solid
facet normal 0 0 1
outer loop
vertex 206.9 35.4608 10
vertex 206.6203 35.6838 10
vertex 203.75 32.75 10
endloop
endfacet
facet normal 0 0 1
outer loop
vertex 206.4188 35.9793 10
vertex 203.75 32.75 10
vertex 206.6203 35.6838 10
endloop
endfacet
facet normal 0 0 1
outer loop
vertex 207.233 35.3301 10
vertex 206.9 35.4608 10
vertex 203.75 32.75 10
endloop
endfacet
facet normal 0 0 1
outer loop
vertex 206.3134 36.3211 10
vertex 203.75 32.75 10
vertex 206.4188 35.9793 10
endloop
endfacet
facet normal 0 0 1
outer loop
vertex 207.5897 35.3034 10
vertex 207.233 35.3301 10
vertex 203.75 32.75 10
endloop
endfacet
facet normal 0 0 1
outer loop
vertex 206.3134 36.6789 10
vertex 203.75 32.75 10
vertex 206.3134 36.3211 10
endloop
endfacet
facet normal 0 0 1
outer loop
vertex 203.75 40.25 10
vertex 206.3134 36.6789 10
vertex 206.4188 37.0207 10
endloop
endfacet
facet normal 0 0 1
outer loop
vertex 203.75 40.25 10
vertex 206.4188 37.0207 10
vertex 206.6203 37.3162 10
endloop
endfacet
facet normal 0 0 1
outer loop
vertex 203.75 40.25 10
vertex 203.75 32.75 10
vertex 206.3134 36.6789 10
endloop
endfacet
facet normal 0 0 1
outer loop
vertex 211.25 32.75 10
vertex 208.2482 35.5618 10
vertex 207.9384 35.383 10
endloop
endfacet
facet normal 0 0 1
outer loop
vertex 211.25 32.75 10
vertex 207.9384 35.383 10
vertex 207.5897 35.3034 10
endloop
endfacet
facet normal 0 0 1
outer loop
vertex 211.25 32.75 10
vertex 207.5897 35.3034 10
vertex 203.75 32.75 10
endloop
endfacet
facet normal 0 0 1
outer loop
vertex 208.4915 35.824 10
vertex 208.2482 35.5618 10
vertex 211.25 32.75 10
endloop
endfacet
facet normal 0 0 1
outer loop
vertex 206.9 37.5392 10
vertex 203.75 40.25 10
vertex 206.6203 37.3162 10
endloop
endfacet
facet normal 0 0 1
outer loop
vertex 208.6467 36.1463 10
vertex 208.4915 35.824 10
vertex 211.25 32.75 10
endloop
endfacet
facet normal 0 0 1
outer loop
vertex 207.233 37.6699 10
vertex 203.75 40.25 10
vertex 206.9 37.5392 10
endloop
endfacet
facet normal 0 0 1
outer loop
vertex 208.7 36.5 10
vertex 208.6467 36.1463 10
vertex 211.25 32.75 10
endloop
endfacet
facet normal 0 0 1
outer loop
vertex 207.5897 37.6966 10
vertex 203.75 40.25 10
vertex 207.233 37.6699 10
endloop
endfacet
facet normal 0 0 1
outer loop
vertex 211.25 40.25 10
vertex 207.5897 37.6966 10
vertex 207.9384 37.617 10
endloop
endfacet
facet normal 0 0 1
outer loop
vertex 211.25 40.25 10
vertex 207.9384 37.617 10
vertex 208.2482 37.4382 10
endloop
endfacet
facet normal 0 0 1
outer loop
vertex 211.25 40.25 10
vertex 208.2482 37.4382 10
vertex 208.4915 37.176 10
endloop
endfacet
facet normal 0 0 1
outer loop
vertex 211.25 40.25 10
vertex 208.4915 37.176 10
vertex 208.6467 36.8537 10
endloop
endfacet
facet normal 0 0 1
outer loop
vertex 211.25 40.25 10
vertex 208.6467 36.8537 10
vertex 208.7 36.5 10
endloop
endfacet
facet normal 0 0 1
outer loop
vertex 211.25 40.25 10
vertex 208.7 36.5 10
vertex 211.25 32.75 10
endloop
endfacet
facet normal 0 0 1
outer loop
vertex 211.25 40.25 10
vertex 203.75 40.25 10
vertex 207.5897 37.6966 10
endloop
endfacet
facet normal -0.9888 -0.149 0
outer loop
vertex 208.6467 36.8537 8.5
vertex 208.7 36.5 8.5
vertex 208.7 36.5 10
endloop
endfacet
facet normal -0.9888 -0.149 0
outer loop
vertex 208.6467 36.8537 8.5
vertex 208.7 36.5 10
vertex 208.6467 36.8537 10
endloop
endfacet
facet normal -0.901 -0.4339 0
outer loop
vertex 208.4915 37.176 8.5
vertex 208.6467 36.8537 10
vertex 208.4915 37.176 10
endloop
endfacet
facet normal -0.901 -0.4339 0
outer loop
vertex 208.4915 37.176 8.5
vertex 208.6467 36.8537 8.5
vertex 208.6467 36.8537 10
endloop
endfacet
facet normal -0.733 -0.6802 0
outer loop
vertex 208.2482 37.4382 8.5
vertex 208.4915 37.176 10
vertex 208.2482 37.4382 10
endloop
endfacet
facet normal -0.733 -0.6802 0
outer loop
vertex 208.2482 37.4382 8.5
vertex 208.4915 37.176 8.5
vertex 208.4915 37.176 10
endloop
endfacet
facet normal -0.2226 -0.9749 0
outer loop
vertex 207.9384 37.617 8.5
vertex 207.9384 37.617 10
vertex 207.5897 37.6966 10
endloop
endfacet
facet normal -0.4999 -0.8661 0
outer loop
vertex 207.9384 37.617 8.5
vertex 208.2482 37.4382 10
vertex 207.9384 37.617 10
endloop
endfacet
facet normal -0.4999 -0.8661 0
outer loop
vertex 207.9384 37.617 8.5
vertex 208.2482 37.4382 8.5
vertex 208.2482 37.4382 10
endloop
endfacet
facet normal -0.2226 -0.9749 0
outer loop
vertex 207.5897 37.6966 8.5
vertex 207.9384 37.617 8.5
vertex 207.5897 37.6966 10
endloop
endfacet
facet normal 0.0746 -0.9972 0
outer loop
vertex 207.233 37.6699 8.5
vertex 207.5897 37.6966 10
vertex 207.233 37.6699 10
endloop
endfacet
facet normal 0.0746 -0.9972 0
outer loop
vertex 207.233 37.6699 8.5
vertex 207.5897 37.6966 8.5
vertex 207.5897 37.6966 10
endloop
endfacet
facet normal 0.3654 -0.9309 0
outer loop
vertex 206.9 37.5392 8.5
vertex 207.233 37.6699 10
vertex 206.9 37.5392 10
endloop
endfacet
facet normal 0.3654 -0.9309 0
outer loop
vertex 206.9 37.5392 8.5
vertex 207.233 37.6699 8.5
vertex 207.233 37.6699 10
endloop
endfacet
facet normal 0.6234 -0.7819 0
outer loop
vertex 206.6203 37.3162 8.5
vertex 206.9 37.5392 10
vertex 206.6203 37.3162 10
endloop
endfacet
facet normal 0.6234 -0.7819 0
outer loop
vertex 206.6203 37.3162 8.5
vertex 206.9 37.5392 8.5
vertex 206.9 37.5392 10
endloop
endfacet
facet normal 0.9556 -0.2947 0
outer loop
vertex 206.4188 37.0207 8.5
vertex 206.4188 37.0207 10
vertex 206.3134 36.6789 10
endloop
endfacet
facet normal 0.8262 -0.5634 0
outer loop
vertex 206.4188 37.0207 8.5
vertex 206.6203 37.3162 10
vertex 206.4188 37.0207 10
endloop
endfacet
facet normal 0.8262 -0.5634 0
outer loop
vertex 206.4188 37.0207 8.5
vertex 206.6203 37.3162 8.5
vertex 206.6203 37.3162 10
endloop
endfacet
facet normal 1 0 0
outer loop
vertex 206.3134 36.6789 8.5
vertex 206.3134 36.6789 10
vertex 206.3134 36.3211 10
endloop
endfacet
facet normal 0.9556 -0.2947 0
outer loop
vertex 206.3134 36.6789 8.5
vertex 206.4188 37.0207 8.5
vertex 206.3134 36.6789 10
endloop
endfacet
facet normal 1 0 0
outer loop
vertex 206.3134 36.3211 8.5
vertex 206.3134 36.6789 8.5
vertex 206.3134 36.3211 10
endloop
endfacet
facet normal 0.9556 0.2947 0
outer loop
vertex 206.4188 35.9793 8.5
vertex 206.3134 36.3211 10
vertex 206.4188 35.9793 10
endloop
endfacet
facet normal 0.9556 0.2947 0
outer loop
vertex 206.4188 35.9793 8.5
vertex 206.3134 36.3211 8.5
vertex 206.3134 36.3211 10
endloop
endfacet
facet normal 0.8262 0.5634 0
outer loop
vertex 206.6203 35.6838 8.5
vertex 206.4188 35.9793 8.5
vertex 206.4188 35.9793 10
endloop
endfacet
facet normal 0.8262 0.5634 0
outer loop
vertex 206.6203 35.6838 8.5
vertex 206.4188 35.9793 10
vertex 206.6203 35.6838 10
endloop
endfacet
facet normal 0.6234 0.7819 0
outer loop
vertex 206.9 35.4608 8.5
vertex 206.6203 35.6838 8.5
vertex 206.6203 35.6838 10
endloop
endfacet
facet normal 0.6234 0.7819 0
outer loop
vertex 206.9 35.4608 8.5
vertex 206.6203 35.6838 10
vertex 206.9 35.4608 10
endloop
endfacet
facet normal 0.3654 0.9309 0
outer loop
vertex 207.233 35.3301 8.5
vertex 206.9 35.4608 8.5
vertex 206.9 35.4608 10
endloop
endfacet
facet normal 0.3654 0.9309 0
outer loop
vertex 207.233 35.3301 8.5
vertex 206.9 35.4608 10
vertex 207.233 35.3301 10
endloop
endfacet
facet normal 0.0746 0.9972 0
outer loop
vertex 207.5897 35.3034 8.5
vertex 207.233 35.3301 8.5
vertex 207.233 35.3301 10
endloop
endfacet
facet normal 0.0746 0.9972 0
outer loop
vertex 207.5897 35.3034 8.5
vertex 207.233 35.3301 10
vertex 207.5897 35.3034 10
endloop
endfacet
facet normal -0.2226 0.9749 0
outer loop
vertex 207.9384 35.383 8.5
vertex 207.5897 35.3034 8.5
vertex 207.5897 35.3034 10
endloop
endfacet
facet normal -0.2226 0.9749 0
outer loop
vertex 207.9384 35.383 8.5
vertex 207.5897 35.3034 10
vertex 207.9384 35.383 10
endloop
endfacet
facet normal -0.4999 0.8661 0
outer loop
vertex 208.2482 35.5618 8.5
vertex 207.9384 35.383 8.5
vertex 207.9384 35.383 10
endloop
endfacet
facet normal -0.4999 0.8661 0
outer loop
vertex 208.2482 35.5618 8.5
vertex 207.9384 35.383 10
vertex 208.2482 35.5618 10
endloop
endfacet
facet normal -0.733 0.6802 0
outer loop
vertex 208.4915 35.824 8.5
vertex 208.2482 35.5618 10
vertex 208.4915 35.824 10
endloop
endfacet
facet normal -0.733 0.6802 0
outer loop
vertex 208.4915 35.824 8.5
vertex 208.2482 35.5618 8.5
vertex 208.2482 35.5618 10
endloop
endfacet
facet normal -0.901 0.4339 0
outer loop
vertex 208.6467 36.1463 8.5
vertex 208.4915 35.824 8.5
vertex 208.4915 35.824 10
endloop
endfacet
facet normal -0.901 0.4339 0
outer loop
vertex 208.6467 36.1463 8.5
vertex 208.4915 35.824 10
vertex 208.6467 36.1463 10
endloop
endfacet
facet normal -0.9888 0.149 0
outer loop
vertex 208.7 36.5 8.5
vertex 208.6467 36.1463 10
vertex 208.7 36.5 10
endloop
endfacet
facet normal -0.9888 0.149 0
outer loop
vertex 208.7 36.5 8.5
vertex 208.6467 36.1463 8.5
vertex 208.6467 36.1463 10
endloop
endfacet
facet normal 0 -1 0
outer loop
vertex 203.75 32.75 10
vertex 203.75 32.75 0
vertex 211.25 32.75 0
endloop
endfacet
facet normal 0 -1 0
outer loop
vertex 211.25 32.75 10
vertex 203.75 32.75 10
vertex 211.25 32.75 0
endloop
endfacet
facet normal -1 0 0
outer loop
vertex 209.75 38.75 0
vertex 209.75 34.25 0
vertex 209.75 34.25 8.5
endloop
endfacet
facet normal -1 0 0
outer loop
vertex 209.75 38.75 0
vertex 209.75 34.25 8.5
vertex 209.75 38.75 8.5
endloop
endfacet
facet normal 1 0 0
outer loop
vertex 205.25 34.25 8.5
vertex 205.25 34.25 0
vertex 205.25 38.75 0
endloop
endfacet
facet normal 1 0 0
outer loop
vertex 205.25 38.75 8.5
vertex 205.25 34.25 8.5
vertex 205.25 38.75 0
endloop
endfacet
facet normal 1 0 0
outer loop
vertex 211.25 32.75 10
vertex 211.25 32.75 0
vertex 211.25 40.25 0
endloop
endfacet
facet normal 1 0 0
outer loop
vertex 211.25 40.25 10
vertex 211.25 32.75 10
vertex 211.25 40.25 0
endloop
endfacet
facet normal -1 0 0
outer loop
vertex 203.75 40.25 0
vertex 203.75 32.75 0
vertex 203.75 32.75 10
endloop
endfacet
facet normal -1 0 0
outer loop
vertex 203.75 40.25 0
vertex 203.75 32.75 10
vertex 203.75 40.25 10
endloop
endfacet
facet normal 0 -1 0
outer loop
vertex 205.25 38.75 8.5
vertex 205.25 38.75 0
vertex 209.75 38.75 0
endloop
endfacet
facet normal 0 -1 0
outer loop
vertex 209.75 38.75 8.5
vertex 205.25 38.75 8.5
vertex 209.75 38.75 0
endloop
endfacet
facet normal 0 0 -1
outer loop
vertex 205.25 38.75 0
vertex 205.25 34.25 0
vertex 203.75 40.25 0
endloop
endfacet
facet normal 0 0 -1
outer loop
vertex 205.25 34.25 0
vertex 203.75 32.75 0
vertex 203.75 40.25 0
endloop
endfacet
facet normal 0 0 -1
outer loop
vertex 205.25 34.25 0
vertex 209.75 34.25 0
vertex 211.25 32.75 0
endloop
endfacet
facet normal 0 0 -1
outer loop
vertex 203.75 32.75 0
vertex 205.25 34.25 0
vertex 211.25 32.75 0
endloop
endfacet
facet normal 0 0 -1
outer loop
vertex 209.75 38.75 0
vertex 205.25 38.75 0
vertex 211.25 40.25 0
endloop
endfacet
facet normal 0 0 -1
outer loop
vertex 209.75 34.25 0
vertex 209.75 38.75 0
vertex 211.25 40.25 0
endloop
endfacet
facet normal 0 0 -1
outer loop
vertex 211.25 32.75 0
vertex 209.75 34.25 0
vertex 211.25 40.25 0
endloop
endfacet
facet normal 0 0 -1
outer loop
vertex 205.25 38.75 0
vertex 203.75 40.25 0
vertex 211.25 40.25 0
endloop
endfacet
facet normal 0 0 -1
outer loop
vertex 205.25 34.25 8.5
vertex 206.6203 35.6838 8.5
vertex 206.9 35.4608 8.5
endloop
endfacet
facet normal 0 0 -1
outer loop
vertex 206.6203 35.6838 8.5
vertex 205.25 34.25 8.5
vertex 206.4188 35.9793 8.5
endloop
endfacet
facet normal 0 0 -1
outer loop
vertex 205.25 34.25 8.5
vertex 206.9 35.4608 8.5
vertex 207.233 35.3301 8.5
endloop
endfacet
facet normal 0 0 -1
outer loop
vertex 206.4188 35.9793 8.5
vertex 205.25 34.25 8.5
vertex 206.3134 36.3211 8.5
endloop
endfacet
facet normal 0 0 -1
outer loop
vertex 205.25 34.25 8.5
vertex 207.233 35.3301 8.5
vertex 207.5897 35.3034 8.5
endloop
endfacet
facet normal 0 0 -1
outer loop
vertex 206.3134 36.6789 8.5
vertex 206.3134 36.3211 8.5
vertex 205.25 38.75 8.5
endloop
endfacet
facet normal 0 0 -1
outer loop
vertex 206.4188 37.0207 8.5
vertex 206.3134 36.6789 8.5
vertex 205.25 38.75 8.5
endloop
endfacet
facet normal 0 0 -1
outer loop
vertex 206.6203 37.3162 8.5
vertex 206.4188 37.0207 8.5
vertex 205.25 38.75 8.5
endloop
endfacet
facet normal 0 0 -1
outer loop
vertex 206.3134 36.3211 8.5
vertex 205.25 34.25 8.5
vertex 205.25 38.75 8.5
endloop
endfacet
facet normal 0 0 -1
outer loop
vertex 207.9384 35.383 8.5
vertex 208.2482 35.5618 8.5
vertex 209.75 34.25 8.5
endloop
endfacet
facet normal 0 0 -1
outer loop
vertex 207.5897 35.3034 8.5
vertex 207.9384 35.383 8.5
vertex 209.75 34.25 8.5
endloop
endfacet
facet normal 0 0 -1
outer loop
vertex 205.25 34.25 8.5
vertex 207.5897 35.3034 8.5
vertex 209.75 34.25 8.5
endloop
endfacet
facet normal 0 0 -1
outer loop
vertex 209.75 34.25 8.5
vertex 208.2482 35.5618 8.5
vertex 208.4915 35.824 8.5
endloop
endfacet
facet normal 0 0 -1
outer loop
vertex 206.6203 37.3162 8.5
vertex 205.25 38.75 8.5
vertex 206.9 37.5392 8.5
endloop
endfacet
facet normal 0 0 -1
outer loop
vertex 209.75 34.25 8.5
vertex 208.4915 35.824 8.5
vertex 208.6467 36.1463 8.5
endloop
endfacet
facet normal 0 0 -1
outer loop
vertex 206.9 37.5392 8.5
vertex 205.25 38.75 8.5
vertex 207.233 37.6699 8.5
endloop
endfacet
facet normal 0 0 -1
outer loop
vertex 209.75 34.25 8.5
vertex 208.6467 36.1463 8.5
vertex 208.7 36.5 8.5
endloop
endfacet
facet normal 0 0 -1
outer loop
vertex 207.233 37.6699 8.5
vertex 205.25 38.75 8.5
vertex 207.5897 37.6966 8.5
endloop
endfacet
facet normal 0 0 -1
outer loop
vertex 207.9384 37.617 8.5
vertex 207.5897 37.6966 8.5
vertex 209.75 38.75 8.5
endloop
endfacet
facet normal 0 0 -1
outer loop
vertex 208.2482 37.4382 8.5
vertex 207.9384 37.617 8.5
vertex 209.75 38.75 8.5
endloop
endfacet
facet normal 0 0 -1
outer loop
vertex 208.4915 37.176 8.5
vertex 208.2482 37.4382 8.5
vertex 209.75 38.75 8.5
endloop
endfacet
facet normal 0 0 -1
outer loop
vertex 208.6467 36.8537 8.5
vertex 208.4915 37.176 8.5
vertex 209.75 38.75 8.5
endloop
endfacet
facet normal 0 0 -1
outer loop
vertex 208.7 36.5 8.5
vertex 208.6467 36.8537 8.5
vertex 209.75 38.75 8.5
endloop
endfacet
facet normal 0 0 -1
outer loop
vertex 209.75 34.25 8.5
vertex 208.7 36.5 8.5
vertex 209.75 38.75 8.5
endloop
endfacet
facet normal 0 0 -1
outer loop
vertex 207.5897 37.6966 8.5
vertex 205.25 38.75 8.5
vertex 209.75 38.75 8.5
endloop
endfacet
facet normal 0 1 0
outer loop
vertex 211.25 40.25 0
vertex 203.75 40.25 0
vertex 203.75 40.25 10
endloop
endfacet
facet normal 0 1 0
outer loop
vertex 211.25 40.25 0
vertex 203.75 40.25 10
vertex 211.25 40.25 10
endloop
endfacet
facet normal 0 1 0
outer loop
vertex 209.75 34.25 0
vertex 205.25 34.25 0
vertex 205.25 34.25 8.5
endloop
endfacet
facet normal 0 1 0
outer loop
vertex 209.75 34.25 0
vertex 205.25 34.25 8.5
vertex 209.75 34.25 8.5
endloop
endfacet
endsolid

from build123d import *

# Parameters (mm, degrees)
CYLINDER111_R     = 1.2
CYLINDER111_DEPTH = 10
BOX065_W          = 4.5
BOX065_H          = 4.5
BOX065_DEPTH      = 10
BOX064_W          = 7.5
BOX064_H          = 7.5
BOX064_DEPTH      = 10


with BuildPart() as cylinder111:
    # Cylinder111 → Cylinder111 (new body)
    with BuildSketch(Plane(origin=(7.5, 16.5, 105), x_dir=(1, 0, 0), z_dir=(0, 0, 1))):
        Circle(CYLINDER111_R)
    extrude(amount=CYLINDER111_DEPTH)


with BuildPart() as cube063:
    # Box065 → Box065 (new body)
    with BuildSketch(Plane(origin=(5.25, 14.25, 98.5), x_dir=(1, 0, 0), z_dir=(0, 0, 1))):
        with Locations((2.25, 2.25)):
            Rectangle(BOX065_W, BOX065_H)
    extrude(amount=BOX065_DEPTH)


with BuildPart() as pcbmount:
    # Box064 → Box064 (new body)
    with BuildSketch(Plane(origin=(3.75, 12.75, 100), x_dir=(1, 0, 0), z_dir=(0, 0, 1))):
        with Locations((3.75, 3.75)):
            Rectangle(BOX064_W, BOX064_H)
    extrude(amount=BOX064_DEPTH)

    # Cut080: cut Cube063
    add(cube063.part, mode=Mode.SUBTRACT)

    # Cut081: cut Cylinder111
    add(cylinder111.part, mode=Mode.SUBTRACT)


with BuildPart() as pcbmount_1:
    # Cut081 placement: moved
    add(pcbmount.part.moved(Location((200, 20, -100))))


solid = pcbmount_1.part
